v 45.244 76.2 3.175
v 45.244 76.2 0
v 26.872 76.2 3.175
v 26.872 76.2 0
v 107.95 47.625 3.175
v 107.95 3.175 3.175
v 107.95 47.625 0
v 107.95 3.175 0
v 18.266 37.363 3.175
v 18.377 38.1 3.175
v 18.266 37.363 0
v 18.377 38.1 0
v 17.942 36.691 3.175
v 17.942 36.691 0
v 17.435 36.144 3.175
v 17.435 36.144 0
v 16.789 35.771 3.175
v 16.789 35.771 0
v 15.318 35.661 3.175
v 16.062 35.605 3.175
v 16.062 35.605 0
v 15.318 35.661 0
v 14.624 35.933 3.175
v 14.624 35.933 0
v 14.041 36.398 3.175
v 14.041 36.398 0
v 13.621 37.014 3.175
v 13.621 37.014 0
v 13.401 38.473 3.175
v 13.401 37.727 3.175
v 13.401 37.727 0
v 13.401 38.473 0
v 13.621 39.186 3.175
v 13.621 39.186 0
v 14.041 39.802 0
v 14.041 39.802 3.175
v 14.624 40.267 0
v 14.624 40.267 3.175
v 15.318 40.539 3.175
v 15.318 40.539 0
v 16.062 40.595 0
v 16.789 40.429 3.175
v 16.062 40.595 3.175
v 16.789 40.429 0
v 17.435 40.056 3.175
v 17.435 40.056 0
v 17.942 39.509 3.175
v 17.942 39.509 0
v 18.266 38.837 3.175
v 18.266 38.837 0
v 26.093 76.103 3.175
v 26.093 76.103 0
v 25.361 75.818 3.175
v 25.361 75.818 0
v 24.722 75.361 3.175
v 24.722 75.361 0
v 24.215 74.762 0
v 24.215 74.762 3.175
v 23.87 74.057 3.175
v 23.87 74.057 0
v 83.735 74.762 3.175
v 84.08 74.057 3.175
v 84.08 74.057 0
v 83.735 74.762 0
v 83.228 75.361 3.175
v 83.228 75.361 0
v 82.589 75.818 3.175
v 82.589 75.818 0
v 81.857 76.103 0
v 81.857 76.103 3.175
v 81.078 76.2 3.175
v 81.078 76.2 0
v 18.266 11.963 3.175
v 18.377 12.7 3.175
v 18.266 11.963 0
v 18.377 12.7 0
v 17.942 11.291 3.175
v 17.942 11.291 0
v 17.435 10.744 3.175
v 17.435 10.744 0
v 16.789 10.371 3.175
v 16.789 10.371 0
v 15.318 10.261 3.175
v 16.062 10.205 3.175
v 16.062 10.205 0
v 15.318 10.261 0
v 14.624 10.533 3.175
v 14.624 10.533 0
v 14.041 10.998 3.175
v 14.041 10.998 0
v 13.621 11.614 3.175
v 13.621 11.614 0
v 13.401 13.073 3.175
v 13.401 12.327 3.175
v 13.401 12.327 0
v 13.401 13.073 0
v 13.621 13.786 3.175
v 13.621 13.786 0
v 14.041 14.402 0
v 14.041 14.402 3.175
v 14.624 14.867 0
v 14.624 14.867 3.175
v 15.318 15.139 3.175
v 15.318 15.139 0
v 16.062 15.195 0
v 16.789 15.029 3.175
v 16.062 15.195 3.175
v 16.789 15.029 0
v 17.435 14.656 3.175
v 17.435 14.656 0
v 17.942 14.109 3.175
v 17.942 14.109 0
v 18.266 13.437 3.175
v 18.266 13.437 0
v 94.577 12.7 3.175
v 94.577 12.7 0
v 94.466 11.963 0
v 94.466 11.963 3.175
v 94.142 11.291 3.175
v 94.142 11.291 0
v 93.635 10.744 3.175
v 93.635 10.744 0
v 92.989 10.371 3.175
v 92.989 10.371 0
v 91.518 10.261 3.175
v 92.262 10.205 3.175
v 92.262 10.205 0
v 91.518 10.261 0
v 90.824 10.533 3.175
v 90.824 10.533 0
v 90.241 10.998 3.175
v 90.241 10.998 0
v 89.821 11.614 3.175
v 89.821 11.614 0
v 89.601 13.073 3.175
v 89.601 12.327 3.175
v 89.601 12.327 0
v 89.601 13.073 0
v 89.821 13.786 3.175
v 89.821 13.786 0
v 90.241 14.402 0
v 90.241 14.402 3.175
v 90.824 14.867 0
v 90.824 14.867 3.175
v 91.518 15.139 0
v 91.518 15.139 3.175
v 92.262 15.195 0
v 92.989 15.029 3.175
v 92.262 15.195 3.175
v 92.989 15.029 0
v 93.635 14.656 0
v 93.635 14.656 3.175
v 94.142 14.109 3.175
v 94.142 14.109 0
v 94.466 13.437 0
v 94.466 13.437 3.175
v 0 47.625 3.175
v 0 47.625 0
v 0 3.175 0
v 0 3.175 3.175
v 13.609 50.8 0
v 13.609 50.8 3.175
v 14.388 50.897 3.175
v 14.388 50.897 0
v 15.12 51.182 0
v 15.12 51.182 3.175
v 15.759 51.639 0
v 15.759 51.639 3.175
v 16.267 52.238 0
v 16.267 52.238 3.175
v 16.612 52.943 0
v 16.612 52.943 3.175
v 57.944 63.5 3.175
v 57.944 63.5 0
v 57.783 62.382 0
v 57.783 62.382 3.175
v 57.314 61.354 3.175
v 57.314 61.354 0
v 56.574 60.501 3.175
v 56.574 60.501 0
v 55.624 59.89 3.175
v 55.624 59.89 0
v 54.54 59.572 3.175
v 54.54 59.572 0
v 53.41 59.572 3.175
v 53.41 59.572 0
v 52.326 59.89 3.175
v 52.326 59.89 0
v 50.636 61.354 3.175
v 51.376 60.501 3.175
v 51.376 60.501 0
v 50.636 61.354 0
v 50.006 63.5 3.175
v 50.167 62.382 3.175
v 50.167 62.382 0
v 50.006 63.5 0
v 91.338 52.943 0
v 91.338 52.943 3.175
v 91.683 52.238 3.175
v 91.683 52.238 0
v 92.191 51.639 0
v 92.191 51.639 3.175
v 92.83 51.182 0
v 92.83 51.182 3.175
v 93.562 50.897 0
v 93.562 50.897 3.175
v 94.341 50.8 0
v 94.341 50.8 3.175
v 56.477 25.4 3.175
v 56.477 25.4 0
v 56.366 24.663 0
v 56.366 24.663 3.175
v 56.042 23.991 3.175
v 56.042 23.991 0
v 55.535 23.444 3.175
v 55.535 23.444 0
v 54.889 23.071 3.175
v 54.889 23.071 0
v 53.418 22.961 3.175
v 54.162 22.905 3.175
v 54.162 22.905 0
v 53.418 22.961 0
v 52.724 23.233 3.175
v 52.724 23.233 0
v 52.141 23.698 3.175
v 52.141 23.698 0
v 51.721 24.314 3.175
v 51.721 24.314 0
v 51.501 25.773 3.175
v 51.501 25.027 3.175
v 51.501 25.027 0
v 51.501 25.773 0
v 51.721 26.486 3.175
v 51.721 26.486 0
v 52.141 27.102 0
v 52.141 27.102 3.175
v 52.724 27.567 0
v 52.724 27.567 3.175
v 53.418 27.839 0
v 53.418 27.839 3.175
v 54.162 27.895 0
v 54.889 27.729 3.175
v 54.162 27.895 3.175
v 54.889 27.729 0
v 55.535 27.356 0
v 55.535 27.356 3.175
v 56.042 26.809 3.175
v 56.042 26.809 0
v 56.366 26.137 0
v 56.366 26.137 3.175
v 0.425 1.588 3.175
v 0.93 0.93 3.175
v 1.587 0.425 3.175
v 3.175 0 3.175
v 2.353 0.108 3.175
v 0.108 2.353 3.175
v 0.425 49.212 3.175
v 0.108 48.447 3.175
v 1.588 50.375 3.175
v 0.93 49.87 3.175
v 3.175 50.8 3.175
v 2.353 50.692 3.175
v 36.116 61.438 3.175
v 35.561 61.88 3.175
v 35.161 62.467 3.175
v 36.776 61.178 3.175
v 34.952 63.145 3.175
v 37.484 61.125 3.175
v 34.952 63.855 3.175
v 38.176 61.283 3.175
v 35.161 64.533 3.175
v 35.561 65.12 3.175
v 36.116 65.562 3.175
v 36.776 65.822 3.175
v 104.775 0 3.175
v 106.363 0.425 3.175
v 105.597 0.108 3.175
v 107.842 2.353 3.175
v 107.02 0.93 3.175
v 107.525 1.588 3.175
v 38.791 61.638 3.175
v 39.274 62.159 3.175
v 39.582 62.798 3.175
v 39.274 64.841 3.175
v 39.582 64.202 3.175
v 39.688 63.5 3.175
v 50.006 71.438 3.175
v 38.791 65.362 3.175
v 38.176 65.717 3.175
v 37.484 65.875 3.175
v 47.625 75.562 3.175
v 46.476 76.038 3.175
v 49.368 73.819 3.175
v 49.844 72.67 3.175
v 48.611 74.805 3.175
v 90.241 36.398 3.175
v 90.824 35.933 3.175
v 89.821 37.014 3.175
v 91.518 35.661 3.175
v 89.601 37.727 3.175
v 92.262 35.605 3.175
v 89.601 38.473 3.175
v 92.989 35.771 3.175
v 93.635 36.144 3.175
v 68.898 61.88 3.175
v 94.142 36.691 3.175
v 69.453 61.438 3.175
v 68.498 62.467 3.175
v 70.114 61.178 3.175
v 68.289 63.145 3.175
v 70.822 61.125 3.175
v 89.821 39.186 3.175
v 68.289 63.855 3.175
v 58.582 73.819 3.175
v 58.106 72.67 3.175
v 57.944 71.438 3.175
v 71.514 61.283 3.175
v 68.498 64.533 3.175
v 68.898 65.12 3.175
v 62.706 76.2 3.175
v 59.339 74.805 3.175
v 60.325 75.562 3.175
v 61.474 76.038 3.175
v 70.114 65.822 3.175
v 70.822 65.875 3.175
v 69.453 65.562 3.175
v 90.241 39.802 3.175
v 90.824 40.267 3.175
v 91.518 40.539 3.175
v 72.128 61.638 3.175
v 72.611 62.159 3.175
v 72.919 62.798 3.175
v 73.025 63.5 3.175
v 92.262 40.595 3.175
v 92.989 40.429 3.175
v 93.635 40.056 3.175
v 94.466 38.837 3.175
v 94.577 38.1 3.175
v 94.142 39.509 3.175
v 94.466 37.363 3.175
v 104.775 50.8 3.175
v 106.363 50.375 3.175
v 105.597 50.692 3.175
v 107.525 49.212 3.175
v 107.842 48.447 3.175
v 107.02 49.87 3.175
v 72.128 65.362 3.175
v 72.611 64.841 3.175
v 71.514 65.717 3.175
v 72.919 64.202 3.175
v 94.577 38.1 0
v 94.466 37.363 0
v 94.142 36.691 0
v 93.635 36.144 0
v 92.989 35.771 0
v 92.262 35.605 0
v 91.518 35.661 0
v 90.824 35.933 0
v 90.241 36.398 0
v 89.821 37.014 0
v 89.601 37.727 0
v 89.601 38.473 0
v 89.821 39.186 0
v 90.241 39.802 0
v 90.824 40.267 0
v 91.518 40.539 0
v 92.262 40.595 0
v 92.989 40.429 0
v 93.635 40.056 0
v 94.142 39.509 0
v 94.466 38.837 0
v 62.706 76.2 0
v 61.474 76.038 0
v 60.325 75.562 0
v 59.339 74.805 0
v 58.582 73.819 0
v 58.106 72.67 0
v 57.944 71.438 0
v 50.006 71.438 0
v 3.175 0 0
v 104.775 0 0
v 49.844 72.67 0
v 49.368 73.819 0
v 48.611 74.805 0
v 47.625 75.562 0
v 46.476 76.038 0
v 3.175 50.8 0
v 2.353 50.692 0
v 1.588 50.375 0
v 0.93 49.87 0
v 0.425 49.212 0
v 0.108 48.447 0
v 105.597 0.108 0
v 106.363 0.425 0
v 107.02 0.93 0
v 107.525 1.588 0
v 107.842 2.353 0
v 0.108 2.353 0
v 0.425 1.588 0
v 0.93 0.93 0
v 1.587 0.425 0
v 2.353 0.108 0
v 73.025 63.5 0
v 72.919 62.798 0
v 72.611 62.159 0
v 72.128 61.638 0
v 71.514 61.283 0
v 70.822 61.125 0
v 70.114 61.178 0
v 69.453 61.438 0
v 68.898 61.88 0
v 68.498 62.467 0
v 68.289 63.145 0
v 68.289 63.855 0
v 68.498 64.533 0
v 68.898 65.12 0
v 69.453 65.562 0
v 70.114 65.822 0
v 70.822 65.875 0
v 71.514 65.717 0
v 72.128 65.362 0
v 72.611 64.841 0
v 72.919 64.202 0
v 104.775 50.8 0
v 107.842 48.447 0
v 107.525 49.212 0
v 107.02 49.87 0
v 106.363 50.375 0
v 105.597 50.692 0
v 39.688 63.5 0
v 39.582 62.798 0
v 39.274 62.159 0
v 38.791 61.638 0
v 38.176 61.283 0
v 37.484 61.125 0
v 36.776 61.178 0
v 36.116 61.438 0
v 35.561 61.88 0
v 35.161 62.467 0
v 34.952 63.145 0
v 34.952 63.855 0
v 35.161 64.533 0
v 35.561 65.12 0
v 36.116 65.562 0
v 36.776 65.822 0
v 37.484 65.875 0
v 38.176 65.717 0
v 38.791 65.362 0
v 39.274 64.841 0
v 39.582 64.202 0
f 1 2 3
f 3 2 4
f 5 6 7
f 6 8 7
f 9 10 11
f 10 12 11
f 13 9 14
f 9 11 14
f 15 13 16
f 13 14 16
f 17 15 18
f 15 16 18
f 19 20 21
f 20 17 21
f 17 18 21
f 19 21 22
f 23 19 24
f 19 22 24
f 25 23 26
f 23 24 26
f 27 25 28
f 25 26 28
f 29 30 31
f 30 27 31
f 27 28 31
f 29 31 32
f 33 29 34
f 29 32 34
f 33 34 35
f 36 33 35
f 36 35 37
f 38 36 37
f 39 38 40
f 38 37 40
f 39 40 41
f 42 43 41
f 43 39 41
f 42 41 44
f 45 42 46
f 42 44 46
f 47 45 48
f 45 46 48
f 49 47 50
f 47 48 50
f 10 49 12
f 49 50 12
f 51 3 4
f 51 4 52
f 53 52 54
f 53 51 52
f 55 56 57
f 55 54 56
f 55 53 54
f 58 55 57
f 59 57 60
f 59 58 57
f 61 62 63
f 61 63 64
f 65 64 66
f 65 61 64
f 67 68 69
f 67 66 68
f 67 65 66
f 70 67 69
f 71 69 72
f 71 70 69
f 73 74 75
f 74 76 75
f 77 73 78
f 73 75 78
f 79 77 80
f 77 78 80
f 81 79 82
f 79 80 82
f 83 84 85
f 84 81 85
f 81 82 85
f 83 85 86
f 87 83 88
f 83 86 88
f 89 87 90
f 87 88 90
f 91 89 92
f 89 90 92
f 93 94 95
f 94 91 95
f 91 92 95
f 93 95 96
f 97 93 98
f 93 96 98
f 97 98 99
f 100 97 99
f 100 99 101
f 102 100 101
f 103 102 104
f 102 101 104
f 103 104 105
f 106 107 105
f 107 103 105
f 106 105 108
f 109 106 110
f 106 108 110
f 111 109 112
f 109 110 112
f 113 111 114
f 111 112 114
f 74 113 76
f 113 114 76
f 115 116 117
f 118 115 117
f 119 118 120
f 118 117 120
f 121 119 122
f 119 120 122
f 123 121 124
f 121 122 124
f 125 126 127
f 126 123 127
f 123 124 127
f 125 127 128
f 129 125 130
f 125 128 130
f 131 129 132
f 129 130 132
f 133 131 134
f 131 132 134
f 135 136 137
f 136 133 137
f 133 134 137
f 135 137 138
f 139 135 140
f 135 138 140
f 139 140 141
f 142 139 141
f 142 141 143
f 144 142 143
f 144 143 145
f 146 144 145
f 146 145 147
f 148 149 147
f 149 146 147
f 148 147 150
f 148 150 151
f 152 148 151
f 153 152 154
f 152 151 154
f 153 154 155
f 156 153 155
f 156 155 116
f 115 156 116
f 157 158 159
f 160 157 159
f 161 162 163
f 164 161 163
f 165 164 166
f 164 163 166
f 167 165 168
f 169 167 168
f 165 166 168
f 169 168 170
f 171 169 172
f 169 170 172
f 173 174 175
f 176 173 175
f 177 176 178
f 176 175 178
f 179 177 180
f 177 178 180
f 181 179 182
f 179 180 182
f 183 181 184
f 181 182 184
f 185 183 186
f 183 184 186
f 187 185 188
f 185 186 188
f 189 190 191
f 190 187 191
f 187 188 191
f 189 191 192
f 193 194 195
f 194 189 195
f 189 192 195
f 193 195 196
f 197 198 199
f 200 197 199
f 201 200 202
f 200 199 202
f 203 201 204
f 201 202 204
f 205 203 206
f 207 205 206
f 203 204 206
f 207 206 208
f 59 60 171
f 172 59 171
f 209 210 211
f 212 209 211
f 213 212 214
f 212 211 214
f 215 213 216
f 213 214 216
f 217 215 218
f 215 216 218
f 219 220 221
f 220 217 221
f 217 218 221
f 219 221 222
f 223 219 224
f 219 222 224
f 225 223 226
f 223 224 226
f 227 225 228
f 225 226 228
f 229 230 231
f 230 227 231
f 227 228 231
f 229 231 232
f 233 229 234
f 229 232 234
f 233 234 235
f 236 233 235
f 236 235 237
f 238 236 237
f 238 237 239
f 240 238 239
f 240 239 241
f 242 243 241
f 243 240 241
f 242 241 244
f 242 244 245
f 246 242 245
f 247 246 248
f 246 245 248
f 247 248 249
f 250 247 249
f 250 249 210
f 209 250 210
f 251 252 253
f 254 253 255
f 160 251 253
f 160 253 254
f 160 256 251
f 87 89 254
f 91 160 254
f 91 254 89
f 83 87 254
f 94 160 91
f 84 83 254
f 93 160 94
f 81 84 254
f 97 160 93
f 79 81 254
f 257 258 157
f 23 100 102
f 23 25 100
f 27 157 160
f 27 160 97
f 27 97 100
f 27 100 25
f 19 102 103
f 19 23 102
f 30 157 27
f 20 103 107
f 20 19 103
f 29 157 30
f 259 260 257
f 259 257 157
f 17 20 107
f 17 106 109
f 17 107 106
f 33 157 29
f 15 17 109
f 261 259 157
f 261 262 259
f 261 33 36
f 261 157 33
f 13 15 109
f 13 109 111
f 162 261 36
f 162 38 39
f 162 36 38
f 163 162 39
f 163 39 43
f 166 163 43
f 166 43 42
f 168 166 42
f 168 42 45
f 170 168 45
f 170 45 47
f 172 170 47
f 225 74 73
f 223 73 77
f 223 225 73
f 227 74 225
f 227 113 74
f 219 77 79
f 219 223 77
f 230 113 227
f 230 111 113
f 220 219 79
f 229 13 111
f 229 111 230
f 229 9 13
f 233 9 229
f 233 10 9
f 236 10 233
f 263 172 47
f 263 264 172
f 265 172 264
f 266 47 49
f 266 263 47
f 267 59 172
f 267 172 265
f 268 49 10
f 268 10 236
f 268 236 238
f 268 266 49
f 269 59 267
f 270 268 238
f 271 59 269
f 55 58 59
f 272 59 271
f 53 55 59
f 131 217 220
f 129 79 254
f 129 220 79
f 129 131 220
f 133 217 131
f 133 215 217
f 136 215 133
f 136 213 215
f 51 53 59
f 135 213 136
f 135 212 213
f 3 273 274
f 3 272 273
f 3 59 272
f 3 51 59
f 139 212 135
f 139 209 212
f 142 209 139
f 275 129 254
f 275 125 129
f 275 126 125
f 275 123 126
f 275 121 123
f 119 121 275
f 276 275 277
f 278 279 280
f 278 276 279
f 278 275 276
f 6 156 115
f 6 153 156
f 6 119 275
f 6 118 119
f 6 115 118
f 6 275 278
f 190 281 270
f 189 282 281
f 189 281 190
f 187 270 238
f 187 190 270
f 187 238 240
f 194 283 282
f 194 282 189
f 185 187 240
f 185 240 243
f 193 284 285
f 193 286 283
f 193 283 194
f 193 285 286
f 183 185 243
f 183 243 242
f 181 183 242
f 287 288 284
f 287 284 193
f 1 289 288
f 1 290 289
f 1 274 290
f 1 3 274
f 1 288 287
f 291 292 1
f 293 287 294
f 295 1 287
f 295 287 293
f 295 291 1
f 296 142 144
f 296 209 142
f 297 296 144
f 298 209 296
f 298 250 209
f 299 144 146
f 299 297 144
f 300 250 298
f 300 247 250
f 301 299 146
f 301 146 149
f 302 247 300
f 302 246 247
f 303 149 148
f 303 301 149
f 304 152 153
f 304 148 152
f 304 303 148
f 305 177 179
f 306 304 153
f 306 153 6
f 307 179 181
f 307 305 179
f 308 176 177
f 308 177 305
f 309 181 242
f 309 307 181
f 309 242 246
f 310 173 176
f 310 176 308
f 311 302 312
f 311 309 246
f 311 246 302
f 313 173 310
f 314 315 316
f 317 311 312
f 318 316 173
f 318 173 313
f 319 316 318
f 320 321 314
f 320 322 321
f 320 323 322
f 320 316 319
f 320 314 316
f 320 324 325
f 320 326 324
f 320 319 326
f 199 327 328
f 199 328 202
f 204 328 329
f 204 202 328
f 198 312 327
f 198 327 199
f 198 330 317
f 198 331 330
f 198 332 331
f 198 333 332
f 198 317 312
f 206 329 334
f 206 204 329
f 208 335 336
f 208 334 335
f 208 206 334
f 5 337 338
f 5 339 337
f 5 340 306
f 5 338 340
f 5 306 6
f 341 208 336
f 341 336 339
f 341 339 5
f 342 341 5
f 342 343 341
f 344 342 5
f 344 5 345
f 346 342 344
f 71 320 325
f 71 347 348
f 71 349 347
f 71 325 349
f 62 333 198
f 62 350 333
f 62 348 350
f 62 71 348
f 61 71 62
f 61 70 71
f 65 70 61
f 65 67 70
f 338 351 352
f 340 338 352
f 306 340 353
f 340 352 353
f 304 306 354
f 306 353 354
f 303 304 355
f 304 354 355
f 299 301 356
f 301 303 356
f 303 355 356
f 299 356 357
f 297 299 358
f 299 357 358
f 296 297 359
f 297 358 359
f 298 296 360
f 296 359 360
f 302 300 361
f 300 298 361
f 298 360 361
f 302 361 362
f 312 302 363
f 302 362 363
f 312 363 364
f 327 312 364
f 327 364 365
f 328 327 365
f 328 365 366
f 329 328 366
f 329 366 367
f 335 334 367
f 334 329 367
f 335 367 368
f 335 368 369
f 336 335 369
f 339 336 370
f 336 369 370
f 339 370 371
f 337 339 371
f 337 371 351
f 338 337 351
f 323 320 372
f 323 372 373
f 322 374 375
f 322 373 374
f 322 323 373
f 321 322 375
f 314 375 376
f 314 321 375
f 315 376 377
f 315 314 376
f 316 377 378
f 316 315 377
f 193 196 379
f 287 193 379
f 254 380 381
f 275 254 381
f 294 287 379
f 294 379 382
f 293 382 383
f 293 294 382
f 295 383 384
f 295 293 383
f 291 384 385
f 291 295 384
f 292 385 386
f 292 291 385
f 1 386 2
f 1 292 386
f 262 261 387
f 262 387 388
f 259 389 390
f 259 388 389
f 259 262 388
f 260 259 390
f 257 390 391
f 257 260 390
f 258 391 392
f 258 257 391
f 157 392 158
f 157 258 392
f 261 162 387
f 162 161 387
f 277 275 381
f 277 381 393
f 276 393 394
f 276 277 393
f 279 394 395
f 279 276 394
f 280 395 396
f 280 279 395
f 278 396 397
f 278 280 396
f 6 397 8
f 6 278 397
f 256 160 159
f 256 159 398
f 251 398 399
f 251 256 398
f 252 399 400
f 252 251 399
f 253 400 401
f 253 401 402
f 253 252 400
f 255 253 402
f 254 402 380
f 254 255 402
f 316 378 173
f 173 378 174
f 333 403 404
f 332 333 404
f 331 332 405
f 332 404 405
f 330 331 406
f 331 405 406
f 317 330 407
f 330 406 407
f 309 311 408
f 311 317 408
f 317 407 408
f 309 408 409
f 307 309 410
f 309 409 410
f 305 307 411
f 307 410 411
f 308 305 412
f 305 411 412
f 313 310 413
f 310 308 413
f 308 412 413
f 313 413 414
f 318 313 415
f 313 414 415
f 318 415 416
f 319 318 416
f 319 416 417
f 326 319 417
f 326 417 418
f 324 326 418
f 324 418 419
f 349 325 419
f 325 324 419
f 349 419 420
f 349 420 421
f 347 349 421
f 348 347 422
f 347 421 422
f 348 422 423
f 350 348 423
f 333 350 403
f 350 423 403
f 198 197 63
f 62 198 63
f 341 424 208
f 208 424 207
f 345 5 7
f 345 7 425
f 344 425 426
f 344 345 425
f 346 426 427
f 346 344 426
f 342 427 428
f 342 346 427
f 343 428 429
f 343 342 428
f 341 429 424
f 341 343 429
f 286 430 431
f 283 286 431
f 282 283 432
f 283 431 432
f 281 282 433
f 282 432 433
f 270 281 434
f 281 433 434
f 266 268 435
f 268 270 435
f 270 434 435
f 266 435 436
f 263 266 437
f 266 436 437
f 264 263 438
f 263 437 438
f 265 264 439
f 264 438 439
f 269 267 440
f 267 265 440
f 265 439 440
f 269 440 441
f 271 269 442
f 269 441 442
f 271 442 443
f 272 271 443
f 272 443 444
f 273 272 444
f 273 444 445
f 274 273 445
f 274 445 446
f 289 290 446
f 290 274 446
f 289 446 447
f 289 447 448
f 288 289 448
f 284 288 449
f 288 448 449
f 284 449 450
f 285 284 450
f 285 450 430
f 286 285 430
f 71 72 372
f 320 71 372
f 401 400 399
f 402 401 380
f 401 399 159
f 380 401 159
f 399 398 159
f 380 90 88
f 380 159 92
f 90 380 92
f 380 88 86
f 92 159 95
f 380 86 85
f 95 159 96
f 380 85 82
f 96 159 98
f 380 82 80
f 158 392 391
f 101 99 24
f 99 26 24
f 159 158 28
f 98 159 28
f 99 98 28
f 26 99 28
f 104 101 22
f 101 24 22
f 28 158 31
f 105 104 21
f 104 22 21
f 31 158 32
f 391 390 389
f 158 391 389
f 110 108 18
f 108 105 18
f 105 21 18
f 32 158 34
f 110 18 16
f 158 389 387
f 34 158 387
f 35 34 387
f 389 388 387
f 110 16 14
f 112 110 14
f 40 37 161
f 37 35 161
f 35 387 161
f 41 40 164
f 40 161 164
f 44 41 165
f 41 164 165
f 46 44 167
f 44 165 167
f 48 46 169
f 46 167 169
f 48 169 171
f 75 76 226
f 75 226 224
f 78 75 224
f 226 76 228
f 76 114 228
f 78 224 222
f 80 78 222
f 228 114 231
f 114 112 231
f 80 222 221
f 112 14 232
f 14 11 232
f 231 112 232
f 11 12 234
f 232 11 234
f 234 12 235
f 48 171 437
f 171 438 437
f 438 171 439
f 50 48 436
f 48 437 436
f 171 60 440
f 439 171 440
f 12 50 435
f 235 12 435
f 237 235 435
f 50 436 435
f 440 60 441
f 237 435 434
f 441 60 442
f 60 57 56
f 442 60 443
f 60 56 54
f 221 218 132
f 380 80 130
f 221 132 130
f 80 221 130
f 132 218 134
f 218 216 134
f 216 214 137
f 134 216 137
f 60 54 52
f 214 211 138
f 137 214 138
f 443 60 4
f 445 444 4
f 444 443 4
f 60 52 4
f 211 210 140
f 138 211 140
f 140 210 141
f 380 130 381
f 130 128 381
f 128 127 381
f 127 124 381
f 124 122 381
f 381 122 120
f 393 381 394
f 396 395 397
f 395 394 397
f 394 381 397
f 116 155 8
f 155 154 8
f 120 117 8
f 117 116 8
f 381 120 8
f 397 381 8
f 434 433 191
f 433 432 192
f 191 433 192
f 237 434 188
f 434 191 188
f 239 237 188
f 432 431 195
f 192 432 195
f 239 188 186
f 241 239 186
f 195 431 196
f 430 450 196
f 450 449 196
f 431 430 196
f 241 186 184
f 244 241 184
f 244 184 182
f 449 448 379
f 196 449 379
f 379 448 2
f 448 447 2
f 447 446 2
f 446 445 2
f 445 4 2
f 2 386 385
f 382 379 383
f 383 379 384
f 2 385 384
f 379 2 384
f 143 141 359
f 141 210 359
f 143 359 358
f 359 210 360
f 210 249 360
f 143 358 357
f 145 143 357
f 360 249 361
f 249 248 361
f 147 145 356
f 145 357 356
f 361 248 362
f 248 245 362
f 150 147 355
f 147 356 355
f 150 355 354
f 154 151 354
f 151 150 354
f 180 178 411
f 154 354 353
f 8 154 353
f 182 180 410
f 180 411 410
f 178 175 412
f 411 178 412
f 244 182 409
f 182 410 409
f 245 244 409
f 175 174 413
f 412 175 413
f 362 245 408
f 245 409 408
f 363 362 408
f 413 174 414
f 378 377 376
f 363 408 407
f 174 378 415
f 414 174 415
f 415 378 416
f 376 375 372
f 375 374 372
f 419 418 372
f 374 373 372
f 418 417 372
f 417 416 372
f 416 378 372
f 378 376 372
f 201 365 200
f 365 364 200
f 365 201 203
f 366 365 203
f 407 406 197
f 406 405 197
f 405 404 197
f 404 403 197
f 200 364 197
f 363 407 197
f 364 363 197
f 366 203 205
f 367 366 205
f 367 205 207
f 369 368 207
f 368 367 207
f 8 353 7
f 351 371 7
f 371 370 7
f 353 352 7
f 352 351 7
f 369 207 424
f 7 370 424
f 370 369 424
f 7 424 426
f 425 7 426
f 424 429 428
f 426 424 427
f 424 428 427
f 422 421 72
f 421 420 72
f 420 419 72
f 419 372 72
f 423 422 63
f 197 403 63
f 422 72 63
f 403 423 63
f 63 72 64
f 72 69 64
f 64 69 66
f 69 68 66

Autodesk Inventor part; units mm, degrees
ref_plane "YZ Plane" through (0, 0, 0) normal (1, 0, 0) x (0, 1, 0)
ref_plane "XZ Plane" through (0, 0, 0) normal (0, 1, 0) x (-1, 0, 0)
ref_plane "XY Plane" through (0, 0, 0) normal (0, 0, 1) x (1, 0, 0)
sketch "Sketch1" plane through (0, 0, 0) normal (0, 0, 1) x (1, 0, 0)
  line L0 (0, 0) -> (107.95, 0)
  line L1 (107.95, 0) -> (107.95, 50.8)
  line L2 (107.95, 50.8) -> (92.075, 50.8)
  line L3 (92.075, 50.8) -> (83.3438, 76.2)
  line L4 (83.3438, 76.2) -> (57.9438, 76.2)
  line L5 (57.9438, 76.2) -> (57.9438, 63.5)
  line L6 (50.0063, 63.5) -> (50.0063, 76.2)
  line L7 (50.0063, 76.2) -> (24.6062, 76.2)
  line L8 (24.6062, 76.2) -> (15.875, 50.8)
  line L9 (15.875, 50.8) -> (0, 50.8)
  line L10 (0, 50.8) -> (0, 0)
  circle A0 centre (53.975, 25.4) radius 2.5019
  circle A1 centre (15.875, 38.1) radius 2.5019
  circle A2 centre (15.875, 12.7) radius 2.5019
  circle A3 centre (92.075, 38.1) radius 2.5019
  circle A4 centre (92.075, 12.7) radius 2.5019
  arc A5 (50.0063, 63.5) -> (57.9438, 63.5) centre (53.975, 63.5) ccw
  circle A6 centre (37.3063, 63.5) radius 2.3813
  circle A7 centre (70.6437, 63.5) radius 2.3813
  dimension "d0" = 50.8
  dimension "d1" = 107.95
  dimension "d2" = 7.9375
  dimension "d3" = 53.975
  dimension "d4" = 25.4
  dimension "d5" = 5.0038
  dimension "d6" = 38.1
  dimension "d7" = 12.7
  dimension "d8" = 25.4
  dimension "d9" = 38.1
  dimension "d11" = 25.4
  dimension "d12" = 25.4
  dimension "d14" = 12.7
  dimension "d15" = 4.7625
  dimension "d16" = 4.7625
  dimension "d17" = 12.7
  dimension "d18" = 12.7
extrude "Extrusion1" add sketch "Sketch1" along normal blind 3.175
fillet "Fillet1" radius 3.175 8 edges at (15.875, 50.8, 1.5875) (0, 50.8, 1.5875) (0, 0, 1.5875) (107.95, 0, 1.5875) (107.95, 50.8, 1.5875) (92.075, 50.8, 1.5875) (83.3438, 76.2, 1.5875) (24.6062, 76.2, 1.5875)
fillet "Fillet2" radius 4.7625 2 edges at (50.0063, 76.2, 1.5875) (57.9438, 76.2, 1.5875)
equation "\"d16\" = d15"
properties part number "Bumper Plates"
